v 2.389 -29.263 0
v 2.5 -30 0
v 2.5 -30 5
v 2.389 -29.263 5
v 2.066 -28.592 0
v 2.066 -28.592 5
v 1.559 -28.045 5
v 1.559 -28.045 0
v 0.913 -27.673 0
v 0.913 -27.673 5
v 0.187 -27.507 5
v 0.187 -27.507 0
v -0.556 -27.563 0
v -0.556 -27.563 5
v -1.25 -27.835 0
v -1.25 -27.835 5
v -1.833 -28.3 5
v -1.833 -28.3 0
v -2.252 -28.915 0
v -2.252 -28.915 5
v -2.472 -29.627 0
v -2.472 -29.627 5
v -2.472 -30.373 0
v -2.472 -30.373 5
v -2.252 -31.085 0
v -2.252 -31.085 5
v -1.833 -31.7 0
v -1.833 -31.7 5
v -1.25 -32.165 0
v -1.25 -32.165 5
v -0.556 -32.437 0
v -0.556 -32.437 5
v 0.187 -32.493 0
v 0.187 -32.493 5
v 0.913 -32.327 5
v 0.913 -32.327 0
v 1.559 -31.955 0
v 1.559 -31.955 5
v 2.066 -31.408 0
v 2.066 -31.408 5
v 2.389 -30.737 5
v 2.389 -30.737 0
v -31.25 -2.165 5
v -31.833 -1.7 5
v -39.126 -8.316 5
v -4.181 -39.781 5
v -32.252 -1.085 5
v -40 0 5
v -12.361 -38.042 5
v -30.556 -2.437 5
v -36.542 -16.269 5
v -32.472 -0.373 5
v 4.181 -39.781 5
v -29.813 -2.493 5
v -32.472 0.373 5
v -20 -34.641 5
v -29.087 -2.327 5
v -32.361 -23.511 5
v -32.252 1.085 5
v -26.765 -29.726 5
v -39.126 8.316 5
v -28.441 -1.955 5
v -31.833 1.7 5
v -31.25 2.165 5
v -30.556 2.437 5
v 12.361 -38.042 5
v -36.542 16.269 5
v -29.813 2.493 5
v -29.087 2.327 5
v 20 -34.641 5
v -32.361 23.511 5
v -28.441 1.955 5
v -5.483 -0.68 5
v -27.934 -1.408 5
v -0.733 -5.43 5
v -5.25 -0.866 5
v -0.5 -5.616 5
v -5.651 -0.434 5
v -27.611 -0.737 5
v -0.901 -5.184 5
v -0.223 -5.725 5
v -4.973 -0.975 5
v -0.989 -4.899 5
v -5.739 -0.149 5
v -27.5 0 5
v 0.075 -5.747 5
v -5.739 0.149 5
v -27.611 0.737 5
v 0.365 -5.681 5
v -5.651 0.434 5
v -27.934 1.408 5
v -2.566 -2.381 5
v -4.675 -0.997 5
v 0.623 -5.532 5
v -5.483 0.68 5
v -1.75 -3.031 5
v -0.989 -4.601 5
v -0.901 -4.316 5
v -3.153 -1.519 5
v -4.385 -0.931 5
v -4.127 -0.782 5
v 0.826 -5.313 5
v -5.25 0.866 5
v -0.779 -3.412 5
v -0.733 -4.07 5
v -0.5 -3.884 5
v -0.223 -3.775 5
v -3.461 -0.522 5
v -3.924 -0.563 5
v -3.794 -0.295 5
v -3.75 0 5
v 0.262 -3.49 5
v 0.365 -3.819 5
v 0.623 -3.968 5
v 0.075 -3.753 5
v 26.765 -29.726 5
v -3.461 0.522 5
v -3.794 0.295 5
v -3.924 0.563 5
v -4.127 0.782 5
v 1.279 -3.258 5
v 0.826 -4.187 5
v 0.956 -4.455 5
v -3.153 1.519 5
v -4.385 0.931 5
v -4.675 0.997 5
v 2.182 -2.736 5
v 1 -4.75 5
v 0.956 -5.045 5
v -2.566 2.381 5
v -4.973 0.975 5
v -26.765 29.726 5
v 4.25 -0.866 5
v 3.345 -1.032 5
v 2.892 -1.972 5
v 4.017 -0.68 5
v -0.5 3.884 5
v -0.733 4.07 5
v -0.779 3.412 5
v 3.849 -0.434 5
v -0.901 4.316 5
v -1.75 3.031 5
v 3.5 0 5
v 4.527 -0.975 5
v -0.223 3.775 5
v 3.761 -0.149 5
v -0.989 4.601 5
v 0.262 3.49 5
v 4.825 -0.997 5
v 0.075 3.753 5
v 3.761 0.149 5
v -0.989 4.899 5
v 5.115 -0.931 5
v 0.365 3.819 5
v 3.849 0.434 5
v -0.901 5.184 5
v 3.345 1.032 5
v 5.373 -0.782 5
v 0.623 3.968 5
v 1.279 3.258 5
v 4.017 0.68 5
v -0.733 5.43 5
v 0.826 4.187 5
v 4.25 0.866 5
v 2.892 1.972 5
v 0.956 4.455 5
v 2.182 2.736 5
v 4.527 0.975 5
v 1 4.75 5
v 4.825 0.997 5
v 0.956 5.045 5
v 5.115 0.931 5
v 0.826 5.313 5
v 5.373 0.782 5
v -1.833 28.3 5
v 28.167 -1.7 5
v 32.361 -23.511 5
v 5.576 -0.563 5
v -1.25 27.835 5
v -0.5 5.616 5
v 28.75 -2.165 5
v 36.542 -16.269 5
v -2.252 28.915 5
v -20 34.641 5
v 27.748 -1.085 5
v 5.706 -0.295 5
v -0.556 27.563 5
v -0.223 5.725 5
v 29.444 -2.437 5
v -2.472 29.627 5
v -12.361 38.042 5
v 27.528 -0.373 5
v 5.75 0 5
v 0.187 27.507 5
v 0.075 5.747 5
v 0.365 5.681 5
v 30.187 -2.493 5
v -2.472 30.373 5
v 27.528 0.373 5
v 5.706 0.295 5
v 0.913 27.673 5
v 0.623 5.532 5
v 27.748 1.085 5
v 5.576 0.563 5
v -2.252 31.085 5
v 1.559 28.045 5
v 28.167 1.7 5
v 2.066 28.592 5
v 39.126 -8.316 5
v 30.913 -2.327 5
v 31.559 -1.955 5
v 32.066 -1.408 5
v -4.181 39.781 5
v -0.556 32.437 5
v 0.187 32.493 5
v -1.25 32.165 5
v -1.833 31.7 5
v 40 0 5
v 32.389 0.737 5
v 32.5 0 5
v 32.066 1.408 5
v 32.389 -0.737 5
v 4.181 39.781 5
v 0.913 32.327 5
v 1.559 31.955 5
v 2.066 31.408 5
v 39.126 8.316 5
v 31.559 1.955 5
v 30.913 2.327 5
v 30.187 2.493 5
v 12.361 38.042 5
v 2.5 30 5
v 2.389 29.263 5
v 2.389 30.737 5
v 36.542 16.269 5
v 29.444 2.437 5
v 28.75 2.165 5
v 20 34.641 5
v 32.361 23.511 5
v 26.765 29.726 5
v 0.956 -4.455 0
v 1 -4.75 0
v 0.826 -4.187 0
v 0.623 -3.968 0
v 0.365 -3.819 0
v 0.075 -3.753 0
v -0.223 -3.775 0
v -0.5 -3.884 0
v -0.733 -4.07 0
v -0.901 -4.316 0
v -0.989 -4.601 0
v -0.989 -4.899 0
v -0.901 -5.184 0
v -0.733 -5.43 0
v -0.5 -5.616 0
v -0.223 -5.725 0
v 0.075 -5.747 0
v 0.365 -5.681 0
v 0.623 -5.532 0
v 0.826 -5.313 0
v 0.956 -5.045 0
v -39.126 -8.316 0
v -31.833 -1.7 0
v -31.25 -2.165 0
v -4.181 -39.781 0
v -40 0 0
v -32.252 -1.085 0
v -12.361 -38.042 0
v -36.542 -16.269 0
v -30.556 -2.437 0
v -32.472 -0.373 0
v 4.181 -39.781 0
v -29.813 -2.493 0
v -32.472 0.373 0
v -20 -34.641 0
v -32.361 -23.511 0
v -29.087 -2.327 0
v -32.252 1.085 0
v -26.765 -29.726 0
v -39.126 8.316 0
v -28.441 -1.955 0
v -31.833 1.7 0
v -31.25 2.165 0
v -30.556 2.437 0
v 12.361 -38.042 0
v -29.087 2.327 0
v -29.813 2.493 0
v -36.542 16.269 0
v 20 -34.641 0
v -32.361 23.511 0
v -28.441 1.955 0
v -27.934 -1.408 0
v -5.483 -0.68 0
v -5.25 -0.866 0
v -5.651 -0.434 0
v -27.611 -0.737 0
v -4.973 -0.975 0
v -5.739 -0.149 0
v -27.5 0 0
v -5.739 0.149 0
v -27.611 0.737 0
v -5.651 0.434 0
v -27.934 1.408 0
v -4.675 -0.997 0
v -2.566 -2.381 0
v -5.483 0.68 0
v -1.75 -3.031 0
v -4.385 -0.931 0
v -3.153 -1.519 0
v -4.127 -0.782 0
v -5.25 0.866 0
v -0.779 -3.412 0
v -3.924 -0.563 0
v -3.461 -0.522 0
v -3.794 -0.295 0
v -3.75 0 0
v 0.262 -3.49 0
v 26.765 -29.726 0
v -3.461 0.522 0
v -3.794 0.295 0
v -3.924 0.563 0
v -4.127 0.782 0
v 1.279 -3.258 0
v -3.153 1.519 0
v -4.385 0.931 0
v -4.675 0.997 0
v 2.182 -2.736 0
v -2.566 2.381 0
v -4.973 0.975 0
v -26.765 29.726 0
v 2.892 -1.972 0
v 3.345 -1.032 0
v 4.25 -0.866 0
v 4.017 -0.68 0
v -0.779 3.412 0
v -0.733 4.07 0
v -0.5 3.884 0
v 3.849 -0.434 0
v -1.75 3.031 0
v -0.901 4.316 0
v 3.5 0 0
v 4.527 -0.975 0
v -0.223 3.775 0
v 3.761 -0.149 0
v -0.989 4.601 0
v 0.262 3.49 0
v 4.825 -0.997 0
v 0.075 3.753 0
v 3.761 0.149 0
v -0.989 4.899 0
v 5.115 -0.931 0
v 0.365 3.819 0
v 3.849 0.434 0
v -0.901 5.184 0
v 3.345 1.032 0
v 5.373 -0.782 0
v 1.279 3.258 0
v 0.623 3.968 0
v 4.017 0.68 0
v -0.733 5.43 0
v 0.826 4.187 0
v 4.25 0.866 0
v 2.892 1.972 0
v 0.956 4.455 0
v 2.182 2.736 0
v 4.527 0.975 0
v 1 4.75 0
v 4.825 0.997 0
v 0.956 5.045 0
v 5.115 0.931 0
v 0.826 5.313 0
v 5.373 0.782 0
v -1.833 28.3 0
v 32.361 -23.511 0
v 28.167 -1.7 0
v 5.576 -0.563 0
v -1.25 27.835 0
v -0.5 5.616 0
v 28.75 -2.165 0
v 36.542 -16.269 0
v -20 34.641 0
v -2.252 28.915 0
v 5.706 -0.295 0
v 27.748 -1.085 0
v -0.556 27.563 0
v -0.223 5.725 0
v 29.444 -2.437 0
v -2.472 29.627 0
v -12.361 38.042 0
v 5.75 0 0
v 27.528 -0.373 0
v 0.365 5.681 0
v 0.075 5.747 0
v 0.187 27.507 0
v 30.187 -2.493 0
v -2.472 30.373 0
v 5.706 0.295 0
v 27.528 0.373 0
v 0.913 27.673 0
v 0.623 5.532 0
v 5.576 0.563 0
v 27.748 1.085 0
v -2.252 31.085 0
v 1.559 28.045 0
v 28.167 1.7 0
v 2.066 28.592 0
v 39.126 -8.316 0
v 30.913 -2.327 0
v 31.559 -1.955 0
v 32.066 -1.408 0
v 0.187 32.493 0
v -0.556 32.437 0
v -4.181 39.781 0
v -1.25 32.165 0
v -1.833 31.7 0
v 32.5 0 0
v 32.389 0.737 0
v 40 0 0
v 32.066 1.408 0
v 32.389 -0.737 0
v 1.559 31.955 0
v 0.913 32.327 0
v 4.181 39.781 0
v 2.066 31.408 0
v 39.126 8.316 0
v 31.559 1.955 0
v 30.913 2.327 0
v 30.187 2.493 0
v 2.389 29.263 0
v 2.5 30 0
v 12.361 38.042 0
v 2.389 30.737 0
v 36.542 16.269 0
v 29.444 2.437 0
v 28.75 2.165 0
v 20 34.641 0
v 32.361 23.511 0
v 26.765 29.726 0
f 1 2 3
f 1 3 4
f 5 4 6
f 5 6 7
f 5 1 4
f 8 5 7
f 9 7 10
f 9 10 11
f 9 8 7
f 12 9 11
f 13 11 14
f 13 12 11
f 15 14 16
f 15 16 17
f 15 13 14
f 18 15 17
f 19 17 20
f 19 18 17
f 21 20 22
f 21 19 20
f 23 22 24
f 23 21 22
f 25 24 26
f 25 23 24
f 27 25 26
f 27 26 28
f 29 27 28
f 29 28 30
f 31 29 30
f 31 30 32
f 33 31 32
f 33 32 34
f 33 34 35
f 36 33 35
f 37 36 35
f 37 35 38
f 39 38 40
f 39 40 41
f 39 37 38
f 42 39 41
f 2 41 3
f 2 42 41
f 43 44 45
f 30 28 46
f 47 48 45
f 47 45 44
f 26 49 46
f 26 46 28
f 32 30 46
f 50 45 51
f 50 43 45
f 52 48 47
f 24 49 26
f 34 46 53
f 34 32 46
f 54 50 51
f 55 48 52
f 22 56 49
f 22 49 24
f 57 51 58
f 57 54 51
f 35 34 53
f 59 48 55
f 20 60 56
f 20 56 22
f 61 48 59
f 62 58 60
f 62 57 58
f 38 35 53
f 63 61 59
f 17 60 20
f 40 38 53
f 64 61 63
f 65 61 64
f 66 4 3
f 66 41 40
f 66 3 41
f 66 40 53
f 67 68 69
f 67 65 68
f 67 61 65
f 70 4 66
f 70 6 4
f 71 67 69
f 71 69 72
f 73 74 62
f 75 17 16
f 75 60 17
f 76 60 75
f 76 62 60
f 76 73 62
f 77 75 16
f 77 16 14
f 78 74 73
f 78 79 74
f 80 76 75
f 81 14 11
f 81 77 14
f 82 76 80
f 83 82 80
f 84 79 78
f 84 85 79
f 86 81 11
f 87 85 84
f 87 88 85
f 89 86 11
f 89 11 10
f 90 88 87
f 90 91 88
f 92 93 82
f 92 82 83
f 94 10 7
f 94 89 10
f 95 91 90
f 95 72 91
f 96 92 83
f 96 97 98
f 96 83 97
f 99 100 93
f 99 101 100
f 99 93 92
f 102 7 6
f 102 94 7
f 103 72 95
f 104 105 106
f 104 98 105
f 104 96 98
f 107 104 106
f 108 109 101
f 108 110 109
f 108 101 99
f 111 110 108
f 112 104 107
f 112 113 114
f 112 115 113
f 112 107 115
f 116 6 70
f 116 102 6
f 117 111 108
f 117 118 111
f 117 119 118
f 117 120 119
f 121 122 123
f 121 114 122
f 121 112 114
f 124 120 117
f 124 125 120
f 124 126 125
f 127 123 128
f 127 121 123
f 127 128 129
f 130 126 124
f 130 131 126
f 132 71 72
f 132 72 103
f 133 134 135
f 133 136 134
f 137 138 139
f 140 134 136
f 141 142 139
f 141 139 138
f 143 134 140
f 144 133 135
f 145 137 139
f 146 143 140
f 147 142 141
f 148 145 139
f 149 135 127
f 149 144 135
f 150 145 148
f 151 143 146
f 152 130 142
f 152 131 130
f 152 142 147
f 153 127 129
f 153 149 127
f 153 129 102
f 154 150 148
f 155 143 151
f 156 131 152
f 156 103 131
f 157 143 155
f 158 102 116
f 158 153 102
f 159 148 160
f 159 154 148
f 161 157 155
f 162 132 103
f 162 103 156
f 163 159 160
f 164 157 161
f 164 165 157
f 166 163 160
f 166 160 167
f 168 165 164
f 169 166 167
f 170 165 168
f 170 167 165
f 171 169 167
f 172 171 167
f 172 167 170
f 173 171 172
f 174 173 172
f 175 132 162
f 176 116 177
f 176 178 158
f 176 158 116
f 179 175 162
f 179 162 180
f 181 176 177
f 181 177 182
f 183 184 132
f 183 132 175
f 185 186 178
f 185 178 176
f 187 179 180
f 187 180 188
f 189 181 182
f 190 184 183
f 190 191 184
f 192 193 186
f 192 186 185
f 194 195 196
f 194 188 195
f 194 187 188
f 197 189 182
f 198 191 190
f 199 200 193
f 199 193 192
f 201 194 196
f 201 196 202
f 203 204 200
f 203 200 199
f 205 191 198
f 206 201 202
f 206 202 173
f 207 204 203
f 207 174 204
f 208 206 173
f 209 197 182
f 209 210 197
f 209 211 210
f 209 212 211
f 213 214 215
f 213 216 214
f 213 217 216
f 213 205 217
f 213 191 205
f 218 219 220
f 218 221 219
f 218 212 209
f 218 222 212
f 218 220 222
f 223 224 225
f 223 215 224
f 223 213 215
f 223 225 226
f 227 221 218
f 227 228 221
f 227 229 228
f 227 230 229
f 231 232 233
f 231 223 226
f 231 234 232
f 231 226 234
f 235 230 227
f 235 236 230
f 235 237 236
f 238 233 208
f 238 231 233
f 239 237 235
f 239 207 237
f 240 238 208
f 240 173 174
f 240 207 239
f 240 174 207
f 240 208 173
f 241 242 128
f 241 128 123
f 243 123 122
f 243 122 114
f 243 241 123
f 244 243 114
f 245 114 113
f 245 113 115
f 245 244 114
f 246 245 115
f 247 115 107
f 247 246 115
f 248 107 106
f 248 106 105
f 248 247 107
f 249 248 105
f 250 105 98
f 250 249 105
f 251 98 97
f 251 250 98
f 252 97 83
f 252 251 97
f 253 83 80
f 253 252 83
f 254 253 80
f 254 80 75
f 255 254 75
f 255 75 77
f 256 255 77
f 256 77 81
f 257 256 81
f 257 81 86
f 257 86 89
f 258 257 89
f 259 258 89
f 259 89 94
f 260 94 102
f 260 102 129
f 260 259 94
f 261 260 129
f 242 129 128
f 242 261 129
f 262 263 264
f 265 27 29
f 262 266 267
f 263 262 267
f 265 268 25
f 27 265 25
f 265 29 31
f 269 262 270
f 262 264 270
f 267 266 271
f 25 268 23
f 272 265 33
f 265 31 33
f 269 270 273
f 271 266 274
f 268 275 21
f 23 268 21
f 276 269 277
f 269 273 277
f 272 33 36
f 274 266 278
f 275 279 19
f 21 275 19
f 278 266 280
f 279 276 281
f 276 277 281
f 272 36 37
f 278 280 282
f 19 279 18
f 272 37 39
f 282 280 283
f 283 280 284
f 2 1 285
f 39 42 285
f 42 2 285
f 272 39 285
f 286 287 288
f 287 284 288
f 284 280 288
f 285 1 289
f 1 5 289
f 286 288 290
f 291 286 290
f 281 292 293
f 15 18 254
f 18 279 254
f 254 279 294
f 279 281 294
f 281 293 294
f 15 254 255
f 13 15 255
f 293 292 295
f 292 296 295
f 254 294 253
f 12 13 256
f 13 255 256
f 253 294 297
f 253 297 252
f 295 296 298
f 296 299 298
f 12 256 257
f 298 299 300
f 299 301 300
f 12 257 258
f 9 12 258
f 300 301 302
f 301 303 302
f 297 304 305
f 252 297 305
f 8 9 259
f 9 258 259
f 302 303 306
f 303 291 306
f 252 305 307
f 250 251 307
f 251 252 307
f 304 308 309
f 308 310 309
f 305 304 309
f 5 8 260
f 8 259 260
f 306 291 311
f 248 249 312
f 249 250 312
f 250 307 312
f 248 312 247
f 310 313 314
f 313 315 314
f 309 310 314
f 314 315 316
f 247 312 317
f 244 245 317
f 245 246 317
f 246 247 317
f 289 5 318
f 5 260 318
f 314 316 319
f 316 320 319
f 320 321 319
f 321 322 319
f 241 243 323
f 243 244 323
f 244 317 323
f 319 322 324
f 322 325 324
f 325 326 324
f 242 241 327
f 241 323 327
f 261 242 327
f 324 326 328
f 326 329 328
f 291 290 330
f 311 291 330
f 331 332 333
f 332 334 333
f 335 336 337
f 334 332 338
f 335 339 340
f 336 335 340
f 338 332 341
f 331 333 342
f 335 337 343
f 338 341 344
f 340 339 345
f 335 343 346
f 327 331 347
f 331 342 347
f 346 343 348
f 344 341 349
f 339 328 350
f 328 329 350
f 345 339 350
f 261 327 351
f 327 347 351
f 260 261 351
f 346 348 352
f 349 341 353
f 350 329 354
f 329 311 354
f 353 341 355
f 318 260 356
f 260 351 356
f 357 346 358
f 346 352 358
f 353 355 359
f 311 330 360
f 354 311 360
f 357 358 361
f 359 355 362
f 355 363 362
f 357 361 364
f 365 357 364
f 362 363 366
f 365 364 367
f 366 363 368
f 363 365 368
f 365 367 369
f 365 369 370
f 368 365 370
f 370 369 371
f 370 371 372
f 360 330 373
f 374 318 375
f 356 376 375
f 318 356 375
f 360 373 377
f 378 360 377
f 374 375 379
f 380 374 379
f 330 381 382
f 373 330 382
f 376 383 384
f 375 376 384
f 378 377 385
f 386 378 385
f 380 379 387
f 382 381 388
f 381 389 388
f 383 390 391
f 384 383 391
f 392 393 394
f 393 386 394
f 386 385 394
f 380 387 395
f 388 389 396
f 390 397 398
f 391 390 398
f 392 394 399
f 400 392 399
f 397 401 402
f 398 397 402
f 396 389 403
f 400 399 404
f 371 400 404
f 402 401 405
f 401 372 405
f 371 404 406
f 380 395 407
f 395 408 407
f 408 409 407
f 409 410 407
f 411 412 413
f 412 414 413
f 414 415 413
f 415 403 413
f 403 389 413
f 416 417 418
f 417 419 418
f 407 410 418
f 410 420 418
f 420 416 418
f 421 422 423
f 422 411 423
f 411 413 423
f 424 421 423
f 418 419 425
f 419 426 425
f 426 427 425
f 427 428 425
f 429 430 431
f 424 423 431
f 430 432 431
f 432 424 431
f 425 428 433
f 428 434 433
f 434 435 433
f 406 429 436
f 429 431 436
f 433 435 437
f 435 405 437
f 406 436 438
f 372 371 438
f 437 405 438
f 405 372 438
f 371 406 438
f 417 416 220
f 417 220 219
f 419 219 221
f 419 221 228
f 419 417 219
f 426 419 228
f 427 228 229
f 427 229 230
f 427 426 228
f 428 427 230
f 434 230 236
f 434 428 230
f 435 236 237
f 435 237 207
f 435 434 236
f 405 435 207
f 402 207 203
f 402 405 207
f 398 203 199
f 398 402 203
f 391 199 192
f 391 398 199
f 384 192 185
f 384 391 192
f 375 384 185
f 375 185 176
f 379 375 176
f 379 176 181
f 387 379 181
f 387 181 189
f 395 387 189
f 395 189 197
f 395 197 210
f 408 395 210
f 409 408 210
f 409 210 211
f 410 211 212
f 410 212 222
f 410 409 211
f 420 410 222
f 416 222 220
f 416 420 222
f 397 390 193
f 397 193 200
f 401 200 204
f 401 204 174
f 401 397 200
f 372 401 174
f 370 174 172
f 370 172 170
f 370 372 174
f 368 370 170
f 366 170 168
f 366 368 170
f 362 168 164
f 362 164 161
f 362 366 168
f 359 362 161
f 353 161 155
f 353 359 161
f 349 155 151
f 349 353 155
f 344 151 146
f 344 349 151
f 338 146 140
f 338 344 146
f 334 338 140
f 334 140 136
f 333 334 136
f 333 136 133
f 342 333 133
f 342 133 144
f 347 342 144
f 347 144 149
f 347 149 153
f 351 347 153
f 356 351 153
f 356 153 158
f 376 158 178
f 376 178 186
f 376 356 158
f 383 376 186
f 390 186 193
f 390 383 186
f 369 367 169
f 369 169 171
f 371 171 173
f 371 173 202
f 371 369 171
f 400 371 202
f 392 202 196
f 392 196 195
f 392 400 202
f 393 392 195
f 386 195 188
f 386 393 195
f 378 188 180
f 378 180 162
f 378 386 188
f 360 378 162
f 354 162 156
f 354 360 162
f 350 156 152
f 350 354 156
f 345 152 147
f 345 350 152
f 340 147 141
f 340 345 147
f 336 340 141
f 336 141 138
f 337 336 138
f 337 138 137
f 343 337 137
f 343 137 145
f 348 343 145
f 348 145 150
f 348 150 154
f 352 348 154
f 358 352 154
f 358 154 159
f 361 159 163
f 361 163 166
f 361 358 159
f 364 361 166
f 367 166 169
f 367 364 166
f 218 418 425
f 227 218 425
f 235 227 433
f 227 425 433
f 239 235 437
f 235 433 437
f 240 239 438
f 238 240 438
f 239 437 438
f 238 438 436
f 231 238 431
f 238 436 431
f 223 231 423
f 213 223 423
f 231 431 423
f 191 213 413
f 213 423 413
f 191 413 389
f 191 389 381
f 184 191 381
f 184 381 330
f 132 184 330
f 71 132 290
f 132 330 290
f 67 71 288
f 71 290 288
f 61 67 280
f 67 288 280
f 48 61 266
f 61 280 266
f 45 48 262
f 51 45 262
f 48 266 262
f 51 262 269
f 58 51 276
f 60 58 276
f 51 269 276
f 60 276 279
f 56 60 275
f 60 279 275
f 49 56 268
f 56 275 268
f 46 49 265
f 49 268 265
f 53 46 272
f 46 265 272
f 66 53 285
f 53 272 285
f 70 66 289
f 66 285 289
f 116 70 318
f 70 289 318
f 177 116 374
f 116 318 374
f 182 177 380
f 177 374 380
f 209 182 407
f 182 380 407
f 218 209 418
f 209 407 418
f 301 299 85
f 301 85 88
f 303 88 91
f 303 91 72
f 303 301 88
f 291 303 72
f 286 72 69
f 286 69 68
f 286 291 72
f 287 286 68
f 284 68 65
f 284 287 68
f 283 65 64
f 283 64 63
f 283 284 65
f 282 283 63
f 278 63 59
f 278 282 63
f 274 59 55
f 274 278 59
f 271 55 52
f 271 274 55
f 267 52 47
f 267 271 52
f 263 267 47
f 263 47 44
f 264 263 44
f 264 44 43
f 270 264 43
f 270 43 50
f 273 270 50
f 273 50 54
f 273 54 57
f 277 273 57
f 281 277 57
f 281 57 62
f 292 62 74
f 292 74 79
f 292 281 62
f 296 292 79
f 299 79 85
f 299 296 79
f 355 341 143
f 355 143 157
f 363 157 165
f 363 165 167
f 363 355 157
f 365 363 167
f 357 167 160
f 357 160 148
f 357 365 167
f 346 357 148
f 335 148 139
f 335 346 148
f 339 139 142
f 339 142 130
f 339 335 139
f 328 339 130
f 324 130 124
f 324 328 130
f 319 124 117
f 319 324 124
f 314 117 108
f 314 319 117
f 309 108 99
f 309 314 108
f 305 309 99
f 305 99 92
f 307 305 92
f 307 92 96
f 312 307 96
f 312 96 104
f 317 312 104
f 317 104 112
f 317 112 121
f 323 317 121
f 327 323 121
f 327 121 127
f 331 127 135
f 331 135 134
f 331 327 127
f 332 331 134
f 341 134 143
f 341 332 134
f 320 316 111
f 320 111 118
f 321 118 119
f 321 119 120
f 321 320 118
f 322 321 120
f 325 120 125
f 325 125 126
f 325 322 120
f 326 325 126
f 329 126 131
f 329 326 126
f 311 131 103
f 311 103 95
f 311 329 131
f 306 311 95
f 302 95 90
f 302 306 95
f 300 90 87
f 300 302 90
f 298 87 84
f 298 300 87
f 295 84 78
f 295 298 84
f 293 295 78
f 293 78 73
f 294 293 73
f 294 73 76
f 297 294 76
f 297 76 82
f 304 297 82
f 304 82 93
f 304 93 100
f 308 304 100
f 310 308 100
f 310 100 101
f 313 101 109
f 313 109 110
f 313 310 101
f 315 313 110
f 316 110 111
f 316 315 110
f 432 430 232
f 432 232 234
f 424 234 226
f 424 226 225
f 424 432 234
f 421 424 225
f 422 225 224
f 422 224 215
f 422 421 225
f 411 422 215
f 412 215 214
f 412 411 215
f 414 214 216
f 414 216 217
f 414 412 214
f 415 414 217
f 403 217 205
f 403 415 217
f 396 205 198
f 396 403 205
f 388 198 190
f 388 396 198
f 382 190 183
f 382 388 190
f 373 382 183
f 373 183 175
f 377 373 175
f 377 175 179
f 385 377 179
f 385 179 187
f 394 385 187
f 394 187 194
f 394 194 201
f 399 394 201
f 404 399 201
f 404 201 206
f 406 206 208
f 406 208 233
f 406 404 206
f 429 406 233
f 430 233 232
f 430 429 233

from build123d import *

# Parameters (mm, degrees)
F0_R     = 40
F0_R_2   = 2.5
F0_R_3   = 15
F0_R_4   = 1
F0_R_5   = 3.5
F1_DEPTH = 5


with BuildPart() as f1:
    # F0 (on Top) → F1 (new body)
    with BuildSketch(Plane.XY):
        Circle(F0_R)
        with Locations((0, -30)):
            Circle(F0_R_2, mode=Mode.SUBTRACT)
        with Locations((-30, 0)):
            Circle(F0_R_2, mode=Mode.SUBTRACT)
        Circle(F0_R_3, mode=Mode.SUBTRACT)
        with Locations((30, 0)):
            Circle(F0_R_2, mode=Mode.SUBTRACT)
        with Locations((0, 30)):
            Circle(F0_R_2, mode=Mode.SUBTRACT)
        Circle(F0_R_3)
        with Locations((0, -4.75)):
            Circle(F0_R_4, mode=Mode.SUBTRACT)
        with Locations((-4.75, 0)):
            Circle(F0_R_4, mode=Mode.SUBTRACT)
        Circle(F0_R_5, mode=Mode.SUBTRACT)
        with Locations((4.75, 0)):
            Circle(F0_R_4, mode=Mode.SUBTRACT)
        with Locations((0, 4.75)):
            Circle(F0_R_4, mode=Mode.SUBTRACT)
    extrude(amount=F1_DEPTH)


solid = f1.part
